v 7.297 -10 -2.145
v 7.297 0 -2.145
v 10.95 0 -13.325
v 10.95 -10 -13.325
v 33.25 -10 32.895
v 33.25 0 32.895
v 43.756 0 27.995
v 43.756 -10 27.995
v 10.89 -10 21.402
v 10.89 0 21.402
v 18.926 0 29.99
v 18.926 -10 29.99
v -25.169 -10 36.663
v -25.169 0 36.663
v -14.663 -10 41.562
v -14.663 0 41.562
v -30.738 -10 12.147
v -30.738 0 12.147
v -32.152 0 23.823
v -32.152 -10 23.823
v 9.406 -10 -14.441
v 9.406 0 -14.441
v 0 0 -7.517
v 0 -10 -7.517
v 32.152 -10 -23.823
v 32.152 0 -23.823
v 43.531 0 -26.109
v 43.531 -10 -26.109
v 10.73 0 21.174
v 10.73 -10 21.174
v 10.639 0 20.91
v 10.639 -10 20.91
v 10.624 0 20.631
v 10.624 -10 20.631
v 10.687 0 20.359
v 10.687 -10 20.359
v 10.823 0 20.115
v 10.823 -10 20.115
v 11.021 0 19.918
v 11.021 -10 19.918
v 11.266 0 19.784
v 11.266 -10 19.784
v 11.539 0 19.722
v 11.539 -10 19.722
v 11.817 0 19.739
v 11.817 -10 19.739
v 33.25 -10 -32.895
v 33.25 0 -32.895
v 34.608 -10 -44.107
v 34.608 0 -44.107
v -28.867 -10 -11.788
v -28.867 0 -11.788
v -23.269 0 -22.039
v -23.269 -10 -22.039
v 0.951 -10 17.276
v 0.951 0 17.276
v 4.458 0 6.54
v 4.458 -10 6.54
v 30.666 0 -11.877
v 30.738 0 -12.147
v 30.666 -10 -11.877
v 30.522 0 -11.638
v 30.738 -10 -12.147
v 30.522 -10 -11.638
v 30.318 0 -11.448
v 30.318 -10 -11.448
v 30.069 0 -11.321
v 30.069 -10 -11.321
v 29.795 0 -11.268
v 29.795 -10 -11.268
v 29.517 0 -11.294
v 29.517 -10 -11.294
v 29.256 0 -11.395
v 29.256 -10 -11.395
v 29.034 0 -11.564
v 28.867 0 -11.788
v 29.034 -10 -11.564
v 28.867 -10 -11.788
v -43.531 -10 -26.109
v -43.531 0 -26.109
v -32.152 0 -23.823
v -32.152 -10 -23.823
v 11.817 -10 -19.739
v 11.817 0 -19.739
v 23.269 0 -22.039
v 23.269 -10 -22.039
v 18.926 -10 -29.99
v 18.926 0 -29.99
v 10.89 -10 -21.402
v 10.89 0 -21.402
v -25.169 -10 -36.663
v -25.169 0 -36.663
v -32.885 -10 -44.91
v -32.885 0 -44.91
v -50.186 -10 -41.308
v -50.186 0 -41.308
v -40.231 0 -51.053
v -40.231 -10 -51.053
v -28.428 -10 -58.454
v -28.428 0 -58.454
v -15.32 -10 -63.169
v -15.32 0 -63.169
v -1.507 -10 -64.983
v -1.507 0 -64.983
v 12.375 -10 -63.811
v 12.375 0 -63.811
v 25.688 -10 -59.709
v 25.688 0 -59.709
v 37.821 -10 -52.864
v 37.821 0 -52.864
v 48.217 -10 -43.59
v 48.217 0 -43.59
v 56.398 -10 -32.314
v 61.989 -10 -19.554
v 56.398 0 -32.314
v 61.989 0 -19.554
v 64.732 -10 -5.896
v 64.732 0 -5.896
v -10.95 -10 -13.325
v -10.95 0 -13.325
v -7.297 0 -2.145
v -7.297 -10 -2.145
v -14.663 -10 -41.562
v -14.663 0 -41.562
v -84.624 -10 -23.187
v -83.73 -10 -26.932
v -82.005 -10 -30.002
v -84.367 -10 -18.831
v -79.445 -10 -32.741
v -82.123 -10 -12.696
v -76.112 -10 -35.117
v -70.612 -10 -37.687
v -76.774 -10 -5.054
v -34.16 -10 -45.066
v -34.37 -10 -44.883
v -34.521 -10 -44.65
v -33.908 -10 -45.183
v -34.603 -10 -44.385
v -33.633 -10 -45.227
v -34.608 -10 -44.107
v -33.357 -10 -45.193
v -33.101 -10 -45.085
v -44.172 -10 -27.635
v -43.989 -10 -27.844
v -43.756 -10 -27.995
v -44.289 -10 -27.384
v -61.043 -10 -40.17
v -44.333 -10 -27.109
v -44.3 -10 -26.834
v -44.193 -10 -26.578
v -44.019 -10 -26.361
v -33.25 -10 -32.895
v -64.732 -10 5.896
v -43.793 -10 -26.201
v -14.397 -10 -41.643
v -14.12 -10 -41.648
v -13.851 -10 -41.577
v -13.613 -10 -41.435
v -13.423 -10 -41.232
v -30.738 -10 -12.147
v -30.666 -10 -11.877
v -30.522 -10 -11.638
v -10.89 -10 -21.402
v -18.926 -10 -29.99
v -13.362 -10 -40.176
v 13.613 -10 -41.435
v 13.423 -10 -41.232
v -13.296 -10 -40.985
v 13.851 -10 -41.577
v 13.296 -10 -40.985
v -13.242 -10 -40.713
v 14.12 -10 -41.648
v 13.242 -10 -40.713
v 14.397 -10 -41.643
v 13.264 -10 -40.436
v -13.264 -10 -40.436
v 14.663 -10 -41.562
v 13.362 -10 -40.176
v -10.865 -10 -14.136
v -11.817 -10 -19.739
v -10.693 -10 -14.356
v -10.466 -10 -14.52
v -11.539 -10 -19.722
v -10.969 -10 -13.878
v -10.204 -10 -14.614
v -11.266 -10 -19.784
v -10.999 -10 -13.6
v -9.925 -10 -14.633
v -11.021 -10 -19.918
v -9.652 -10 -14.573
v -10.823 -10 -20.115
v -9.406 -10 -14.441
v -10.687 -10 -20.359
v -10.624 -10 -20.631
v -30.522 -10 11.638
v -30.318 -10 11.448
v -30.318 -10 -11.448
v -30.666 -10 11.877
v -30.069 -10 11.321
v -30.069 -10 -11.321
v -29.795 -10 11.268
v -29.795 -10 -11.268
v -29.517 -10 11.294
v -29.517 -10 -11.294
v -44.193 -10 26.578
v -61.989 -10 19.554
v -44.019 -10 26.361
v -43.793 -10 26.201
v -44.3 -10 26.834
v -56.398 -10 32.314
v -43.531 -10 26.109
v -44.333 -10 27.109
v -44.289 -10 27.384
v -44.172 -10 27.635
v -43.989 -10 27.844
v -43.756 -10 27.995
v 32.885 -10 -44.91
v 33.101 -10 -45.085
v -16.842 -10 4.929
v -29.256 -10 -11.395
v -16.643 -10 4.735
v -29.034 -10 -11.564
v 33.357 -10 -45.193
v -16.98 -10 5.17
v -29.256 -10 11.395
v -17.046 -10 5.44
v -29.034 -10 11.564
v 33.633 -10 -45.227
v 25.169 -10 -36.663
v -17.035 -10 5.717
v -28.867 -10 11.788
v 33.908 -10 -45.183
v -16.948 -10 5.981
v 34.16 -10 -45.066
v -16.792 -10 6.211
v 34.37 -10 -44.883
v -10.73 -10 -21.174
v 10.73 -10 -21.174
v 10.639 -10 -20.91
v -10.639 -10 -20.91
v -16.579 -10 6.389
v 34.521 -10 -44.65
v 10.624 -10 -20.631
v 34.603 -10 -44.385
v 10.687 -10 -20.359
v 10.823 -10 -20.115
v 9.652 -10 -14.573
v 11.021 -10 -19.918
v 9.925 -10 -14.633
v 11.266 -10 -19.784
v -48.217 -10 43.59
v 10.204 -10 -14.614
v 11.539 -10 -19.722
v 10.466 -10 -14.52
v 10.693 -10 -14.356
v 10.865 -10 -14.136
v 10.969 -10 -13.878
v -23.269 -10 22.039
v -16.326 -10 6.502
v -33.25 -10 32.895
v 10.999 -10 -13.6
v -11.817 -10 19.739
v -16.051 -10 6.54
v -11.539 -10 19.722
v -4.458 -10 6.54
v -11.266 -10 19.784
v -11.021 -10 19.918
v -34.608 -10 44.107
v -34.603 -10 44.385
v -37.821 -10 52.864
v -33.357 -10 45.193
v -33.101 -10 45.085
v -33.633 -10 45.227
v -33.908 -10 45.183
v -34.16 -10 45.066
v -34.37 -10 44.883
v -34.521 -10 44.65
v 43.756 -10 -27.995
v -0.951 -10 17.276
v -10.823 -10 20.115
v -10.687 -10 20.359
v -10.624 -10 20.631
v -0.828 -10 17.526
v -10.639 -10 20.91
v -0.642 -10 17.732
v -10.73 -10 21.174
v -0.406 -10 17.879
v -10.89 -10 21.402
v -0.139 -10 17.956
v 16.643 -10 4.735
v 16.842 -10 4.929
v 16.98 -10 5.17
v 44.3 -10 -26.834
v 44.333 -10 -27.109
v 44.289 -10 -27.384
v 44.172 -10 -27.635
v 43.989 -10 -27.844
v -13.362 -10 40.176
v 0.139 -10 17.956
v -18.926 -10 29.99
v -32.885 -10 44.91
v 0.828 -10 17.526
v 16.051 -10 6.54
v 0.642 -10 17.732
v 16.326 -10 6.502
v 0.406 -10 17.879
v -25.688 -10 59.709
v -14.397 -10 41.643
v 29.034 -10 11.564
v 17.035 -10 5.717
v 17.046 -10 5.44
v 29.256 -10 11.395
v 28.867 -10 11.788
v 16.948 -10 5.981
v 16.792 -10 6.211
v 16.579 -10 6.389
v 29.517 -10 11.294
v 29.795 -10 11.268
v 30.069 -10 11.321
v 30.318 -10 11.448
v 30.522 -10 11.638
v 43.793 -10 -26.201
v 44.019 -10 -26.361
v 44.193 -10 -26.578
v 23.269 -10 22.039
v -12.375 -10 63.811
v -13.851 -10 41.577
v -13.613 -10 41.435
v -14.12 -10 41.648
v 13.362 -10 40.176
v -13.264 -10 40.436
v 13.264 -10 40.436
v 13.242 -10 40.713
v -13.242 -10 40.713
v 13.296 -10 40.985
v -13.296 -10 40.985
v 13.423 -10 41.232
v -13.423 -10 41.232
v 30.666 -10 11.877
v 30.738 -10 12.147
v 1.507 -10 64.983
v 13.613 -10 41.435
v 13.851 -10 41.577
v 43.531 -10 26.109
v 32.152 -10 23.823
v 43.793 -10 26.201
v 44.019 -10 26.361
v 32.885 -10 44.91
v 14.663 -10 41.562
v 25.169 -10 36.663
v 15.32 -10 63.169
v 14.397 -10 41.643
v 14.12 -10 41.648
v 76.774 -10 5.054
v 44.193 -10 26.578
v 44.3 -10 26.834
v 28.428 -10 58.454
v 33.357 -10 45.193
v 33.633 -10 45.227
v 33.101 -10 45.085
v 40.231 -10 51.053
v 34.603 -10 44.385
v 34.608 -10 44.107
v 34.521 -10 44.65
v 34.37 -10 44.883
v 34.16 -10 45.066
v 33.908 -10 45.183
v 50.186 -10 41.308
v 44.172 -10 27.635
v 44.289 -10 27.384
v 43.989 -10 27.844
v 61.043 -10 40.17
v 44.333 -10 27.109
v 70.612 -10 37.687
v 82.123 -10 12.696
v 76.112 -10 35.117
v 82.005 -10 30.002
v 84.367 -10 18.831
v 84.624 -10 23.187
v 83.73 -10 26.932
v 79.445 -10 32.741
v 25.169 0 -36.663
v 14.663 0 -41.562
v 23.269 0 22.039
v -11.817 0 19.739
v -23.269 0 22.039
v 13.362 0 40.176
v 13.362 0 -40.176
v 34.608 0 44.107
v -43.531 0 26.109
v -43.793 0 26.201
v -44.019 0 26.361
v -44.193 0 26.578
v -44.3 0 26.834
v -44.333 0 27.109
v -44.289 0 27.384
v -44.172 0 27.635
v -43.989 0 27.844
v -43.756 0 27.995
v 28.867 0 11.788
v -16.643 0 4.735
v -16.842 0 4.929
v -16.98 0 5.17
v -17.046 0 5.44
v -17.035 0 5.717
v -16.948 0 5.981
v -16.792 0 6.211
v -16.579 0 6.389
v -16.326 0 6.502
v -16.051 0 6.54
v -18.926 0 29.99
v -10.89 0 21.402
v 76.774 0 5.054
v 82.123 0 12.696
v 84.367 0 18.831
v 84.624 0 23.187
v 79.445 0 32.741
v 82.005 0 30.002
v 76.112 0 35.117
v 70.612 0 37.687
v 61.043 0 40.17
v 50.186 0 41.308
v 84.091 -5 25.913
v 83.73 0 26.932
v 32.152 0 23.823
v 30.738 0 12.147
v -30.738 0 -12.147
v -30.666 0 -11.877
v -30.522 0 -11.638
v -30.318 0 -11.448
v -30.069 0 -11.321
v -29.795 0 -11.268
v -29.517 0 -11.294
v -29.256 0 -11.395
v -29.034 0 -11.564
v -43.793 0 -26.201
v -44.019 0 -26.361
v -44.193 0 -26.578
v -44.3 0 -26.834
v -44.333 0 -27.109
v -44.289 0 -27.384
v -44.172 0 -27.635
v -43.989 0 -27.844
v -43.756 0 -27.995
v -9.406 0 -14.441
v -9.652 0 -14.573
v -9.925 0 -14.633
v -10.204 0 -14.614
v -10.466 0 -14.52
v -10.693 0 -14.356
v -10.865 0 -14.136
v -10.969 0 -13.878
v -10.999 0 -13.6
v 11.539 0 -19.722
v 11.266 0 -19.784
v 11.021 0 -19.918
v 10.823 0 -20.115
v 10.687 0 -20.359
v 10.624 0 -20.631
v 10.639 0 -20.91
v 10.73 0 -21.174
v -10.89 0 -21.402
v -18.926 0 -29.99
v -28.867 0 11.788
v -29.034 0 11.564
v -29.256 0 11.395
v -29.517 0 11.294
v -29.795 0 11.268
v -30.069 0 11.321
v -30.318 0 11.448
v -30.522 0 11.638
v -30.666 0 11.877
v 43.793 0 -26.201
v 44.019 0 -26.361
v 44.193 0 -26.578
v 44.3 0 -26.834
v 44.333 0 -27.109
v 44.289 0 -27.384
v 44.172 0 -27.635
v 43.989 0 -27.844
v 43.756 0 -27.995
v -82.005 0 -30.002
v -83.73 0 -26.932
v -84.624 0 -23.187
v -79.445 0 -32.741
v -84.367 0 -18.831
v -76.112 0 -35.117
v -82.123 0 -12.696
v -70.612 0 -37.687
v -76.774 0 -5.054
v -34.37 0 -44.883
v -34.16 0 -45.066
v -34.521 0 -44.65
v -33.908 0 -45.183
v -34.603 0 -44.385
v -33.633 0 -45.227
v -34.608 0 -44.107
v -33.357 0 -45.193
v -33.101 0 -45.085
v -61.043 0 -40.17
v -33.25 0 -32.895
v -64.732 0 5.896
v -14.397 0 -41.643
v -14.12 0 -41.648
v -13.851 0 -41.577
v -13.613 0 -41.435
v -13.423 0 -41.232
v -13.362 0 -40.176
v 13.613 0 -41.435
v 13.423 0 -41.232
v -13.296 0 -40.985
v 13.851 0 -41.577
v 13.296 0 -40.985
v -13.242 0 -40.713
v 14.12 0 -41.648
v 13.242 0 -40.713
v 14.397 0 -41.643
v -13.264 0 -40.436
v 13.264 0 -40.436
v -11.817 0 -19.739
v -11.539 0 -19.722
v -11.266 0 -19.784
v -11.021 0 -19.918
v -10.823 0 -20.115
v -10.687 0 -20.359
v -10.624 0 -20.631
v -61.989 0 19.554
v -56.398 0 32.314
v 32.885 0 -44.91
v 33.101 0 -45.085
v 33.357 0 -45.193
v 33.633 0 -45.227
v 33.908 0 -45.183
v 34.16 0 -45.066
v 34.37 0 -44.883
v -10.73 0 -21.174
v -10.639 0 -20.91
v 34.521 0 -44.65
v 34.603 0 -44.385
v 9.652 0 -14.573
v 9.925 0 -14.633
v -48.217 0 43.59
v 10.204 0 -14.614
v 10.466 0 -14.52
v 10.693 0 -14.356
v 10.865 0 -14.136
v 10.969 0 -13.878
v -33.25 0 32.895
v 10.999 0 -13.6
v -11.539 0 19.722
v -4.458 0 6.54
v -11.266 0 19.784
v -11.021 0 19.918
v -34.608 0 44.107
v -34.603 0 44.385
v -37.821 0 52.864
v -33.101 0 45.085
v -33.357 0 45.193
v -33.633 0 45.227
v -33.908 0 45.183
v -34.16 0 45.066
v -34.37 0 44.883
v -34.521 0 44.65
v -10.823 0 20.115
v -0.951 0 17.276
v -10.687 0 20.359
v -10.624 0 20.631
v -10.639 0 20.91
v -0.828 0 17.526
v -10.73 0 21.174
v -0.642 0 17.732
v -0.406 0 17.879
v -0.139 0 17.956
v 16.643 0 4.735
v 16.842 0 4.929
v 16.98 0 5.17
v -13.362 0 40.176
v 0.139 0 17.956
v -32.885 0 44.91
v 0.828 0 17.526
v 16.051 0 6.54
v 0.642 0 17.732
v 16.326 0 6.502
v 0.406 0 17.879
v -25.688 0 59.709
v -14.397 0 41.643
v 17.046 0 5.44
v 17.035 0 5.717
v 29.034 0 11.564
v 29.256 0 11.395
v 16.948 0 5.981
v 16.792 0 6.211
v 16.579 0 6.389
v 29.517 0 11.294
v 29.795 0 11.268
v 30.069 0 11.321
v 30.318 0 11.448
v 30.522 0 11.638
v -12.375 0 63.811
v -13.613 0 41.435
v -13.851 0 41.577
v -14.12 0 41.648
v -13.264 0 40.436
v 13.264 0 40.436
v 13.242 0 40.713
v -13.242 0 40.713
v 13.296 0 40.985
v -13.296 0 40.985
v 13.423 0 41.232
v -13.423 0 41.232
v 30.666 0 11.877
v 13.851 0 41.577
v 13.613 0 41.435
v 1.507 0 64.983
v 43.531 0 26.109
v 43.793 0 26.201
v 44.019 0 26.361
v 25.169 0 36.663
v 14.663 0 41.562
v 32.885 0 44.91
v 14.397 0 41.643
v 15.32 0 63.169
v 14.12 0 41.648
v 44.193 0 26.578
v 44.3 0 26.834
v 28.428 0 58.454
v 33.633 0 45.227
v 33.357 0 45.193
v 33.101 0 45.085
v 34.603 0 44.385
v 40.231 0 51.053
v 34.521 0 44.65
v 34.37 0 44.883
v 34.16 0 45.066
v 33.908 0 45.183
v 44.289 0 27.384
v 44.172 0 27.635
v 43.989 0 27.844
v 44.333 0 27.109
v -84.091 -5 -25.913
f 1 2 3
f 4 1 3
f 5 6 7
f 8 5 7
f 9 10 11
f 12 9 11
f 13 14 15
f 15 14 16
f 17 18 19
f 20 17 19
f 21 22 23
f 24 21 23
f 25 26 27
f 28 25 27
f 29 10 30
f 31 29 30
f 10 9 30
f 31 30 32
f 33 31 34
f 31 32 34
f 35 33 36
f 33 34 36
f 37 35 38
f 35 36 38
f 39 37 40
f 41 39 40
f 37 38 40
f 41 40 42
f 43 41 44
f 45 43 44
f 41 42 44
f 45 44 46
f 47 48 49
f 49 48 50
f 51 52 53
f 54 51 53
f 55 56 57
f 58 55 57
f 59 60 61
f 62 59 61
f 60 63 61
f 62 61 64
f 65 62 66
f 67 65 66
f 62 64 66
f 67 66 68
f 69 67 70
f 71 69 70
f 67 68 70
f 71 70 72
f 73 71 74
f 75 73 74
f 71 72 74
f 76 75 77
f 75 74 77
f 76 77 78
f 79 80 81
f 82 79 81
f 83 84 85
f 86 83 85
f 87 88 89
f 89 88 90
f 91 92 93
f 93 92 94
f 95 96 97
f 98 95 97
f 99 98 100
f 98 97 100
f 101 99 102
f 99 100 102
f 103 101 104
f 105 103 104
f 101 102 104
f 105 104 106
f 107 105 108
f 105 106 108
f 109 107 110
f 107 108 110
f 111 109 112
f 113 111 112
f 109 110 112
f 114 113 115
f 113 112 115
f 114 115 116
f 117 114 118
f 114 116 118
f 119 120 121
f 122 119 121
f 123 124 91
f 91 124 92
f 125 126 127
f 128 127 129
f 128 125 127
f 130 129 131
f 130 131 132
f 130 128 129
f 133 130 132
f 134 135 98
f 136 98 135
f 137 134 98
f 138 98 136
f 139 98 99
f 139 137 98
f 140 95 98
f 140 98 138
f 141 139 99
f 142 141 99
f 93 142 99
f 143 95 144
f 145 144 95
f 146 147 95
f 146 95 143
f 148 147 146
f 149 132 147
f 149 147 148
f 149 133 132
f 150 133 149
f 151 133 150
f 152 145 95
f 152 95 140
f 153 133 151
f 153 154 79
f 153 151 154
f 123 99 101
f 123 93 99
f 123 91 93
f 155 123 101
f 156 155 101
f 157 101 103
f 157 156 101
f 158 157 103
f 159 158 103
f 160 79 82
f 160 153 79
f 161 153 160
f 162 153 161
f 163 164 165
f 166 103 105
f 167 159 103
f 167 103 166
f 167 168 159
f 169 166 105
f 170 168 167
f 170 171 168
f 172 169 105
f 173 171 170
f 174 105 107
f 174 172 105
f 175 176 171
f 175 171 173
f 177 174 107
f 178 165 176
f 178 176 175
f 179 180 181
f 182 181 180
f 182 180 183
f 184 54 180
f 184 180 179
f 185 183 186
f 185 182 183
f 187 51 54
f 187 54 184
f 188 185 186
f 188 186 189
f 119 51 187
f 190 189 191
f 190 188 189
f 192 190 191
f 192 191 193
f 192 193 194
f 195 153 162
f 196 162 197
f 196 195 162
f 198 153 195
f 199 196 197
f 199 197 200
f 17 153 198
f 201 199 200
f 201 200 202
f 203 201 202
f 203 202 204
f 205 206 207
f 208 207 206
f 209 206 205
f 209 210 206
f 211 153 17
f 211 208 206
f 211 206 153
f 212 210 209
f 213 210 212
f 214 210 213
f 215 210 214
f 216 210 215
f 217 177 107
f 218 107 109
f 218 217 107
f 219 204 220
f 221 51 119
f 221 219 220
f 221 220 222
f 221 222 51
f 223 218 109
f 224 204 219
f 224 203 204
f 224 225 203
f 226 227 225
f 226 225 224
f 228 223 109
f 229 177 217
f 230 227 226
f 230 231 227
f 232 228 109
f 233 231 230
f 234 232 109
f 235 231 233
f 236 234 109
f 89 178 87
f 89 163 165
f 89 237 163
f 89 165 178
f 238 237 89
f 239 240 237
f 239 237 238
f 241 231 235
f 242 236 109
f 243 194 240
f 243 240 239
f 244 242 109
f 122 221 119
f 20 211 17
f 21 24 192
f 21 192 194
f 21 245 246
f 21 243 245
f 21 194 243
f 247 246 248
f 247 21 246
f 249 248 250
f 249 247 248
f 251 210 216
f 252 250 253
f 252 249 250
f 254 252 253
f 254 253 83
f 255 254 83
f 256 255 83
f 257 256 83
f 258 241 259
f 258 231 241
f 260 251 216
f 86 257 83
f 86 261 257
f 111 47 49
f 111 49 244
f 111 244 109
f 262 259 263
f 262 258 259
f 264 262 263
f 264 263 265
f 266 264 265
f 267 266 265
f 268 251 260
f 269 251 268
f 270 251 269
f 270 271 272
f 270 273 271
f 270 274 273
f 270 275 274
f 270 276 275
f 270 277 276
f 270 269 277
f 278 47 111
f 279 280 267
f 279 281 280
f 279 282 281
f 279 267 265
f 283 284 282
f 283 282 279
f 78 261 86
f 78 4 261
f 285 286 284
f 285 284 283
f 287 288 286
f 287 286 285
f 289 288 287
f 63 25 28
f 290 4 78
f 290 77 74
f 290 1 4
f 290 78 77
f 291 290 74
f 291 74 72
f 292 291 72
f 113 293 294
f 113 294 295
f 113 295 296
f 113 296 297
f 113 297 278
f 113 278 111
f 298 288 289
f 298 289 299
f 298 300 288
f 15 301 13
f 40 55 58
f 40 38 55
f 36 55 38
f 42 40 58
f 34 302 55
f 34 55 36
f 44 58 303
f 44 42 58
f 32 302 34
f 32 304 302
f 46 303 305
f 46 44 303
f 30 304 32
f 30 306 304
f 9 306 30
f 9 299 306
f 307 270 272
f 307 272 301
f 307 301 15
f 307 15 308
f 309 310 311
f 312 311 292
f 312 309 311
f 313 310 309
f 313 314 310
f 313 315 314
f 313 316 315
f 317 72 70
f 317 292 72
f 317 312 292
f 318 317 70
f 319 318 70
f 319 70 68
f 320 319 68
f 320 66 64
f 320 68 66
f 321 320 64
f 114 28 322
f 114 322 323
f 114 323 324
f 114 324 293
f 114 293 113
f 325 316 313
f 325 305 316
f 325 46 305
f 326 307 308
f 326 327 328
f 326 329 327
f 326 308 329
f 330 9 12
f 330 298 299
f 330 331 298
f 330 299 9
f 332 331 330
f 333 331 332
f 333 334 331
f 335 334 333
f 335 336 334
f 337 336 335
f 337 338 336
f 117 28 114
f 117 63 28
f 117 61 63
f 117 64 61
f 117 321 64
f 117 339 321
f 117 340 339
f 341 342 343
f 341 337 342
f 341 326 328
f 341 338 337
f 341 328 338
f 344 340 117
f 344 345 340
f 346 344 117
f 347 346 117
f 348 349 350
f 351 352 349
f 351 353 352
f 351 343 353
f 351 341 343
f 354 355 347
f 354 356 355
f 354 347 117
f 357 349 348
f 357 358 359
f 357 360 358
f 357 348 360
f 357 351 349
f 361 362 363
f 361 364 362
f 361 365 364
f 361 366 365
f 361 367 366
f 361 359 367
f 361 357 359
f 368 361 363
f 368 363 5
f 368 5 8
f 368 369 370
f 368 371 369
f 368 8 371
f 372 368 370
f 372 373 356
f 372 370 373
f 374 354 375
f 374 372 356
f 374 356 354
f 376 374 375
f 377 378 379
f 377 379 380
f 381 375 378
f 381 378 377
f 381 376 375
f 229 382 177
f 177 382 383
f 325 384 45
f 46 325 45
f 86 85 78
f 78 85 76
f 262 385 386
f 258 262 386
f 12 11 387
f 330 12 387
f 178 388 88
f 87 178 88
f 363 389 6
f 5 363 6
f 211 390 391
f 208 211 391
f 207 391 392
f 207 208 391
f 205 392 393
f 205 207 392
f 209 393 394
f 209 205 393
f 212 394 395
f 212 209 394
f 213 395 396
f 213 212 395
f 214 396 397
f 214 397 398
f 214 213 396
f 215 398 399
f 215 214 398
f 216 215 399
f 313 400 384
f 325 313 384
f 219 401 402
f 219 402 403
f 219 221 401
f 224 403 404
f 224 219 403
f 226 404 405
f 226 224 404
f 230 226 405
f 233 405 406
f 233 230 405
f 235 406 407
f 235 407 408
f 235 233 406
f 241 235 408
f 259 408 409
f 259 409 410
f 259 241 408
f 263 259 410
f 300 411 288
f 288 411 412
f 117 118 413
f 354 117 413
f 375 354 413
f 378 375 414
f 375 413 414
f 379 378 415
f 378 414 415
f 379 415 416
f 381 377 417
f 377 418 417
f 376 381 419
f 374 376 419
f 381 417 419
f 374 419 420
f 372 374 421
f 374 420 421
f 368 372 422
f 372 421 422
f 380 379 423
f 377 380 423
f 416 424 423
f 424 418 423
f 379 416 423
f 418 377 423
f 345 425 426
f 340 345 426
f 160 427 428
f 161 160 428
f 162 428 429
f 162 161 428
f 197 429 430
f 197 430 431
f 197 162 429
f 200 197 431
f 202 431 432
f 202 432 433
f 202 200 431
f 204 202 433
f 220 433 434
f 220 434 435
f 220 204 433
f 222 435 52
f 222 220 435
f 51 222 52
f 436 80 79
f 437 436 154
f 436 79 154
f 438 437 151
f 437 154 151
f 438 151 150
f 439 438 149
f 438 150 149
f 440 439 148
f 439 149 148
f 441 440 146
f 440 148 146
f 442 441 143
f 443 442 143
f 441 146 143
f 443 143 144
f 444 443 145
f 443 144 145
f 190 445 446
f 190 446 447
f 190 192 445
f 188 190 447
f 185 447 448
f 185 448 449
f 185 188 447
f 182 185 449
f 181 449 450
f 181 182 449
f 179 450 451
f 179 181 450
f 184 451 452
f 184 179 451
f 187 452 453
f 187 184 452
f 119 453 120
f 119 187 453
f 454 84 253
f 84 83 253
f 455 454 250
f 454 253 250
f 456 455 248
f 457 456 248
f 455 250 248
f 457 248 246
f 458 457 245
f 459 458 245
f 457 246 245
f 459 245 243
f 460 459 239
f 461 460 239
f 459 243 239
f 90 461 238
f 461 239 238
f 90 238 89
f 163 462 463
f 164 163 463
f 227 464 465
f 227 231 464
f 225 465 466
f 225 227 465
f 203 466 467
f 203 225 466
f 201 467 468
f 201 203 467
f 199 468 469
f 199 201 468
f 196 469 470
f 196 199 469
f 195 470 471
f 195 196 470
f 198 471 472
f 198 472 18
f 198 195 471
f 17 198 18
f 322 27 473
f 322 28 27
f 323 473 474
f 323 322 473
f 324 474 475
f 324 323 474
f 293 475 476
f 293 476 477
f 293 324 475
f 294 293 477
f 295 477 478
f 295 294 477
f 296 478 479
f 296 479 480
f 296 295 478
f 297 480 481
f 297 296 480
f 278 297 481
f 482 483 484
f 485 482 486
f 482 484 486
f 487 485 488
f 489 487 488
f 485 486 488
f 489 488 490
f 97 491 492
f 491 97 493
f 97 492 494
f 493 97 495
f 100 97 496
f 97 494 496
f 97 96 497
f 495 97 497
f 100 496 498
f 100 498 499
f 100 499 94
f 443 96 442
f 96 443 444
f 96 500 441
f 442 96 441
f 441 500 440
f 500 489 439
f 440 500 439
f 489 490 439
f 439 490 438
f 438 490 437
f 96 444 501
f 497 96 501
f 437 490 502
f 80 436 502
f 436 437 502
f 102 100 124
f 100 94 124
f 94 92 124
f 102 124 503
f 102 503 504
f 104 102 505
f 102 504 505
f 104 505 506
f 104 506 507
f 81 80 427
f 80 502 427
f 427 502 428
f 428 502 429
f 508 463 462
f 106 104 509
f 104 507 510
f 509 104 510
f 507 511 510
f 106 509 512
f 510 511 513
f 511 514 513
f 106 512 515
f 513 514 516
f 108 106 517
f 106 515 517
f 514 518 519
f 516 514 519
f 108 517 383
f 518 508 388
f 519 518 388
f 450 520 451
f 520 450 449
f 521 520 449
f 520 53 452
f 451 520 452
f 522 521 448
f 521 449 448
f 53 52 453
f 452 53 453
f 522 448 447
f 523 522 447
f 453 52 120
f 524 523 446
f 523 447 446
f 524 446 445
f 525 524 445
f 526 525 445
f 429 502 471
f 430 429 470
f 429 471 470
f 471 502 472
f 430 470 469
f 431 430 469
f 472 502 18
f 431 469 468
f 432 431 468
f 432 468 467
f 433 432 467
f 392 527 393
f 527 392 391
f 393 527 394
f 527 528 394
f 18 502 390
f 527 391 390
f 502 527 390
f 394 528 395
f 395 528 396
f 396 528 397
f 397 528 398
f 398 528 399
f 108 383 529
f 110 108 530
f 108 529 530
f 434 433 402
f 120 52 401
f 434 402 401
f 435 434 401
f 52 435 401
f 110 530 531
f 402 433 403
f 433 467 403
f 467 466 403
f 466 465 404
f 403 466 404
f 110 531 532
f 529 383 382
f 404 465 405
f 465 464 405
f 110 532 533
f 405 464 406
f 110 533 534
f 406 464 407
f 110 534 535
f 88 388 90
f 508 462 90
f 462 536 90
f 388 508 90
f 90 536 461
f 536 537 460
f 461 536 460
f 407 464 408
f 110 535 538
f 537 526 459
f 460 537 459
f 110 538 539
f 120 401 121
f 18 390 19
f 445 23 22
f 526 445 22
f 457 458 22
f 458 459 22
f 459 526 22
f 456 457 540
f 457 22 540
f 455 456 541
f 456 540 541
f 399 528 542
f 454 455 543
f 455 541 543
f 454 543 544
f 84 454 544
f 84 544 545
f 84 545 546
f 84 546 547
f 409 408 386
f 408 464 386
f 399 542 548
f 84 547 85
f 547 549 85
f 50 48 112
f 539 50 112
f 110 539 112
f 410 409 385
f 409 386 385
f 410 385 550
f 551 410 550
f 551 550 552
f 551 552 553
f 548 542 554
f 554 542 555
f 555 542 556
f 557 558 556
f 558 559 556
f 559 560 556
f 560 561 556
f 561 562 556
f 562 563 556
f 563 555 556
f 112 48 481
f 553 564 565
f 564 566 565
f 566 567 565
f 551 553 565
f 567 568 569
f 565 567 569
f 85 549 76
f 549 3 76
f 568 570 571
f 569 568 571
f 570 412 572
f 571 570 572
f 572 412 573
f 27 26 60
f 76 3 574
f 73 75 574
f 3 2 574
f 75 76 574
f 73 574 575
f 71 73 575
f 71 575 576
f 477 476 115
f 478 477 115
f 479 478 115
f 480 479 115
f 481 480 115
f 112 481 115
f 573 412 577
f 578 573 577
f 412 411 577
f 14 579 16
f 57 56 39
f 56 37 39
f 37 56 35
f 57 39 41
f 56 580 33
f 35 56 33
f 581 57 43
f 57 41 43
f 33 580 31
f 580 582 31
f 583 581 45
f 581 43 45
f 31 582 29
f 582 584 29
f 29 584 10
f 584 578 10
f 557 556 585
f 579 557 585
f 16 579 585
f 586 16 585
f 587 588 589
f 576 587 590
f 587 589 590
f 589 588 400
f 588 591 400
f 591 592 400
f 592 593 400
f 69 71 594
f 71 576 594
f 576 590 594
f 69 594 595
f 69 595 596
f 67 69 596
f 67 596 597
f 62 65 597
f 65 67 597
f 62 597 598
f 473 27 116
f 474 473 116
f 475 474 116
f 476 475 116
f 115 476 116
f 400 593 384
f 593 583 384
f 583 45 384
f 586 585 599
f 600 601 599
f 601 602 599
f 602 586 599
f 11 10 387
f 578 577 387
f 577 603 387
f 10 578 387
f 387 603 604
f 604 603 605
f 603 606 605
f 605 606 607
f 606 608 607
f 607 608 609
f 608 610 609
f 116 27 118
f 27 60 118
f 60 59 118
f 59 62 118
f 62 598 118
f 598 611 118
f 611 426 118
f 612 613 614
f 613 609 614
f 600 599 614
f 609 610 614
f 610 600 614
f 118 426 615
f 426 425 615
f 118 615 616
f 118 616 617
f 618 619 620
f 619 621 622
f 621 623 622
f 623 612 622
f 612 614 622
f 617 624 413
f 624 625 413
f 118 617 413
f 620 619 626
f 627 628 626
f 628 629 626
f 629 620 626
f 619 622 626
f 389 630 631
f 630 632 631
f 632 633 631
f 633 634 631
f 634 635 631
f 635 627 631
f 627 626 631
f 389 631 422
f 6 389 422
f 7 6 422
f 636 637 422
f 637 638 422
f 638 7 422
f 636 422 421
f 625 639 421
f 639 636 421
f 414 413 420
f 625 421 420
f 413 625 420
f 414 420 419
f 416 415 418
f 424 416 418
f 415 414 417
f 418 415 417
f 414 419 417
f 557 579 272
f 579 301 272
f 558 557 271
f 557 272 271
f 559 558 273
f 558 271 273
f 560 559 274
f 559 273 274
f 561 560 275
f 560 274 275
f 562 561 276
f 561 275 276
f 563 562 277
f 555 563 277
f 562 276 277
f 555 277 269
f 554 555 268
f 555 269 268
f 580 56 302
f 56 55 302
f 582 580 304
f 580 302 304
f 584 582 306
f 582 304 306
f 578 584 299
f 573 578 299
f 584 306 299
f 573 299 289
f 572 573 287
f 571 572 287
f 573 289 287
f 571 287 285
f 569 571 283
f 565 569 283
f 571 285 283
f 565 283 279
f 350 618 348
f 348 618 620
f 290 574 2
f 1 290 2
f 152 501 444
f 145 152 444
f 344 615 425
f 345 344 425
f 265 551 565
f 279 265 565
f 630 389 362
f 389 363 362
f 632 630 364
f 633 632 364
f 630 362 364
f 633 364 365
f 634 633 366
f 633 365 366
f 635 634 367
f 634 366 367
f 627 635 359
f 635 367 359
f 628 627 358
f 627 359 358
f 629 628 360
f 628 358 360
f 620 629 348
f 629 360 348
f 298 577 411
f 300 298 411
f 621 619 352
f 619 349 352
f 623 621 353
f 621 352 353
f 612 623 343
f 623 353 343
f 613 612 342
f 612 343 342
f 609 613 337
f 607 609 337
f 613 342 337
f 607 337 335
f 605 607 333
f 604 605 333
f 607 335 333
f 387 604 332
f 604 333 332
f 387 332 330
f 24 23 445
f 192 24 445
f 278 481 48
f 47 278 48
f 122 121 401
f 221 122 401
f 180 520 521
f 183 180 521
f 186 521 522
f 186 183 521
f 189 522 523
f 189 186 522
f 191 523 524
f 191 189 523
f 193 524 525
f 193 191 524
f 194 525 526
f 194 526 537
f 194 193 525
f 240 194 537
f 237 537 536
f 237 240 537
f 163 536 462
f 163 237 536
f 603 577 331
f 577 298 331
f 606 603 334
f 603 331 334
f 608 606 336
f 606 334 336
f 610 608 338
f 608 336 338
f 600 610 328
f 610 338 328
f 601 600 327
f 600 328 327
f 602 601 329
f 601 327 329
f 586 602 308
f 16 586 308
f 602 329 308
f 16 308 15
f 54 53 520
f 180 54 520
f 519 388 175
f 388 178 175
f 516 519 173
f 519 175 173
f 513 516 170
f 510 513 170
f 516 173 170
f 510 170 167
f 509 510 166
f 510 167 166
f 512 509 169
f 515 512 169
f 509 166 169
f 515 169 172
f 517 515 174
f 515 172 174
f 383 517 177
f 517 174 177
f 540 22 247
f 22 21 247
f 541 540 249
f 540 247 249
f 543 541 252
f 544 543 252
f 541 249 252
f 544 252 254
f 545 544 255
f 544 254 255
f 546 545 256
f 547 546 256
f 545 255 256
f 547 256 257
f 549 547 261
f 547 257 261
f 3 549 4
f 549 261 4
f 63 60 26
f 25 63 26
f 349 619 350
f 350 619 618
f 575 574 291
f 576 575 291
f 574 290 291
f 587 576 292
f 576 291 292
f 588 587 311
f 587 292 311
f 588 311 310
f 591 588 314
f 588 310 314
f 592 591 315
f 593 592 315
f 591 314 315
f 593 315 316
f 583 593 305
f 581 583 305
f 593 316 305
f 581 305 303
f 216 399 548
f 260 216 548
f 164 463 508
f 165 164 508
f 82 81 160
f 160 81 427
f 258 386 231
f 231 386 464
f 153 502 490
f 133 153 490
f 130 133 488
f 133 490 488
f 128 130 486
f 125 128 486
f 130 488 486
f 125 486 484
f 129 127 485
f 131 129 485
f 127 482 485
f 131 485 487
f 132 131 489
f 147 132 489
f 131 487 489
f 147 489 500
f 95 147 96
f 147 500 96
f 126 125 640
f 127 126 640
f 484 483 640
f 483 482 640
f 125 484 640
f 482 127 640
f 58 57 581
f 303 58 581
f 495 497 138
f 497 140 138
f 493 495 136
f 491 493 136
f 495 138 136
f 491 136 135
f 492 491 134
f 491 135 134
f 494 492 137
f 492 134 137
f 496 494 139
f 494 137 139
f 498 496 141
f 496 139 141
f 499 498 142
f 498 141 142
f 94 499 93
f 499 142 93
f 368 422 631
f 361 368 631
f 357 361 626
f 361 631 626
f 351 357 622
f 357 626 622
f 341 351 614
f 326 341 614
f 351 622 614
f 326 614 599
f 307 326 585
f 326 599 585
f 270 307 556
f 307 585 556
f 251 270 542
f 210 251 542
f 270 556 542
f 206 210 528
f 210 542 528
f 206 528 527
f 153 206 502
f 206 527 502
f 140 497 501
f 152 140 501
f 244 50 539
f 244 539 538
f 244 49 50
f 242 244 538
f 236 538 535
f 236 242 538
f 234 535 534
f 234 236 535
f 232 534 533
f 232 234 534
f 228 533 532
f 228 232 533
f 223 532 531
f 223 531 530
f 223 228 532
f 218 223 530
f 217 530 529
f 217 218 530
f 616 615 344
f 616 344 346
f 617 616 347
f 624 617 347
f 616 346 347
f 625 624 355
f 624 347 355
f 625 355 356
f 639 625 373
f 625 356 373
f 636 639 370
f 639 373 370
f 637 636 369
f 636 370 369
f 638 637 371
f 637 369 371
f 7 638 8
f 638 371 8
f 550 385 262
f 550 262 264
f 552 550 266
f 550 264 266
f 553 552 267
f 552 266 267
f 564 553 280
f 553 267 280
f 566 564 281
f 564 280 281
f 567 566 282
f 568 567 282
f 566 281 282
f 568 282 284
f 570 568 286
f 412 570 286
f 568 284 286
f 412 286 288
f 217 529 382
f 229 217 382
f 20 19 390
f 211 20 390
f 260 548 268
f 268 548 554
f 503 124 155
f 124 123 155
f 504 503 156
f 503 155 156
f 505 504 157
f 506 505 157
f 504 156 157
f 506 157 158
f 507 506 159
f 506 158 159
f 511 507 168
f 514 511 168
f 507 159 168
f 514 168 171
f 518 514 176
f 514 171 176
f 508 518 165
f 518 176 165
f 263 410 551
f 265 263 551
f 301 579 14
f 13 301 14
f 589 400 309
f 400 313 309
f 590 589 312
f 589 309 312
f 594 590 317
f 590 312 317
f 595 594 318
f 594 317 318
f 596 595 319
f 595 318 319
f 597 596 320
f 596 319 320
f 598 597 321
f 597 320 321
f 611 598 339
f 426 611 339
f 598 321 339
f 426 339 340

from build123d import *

# Parameters (mm, degrees)
F1_DEPTH = 10
F2_R     = 1


with BuildPart() as f1:
    # F0 (on Front) → F1 (new body)
    with BuildSketch(Plane.XZ):
        with BuildLine():
            add(Edge.make_bspline(
                [(-64.7320359031, 5.8960603655), (-123.067537089, -37.923051477), (-50.1862094657, -41.3079215098)],
                knots=[2.3230612235, 2.3230612235, 2.3230612235, 3.9601240836, 3.9601240836, 3.9601240836], degree=2, weights=[1, 0.68329421, 1]))
            ThreePointArc((-50.1862094657, -41.3079215098), (19.1414535528, -62.1176686289), (64.7320359031, -5.8960603655))
            add(Edge.make_bspline(
                [(64.7320359031, -5.8960603655), (123.067537089, 37.923051477), (50.1862094657, 41.3079215098)],
                knots=[5.4646538771, 5.4646538771, 5.4646538771, 7.1017167372, 7.1017167372, 7.1017167372], degree=2, weights=[1, 0.68329421, 1]))
            ThreePointArc((50.1862094657, 41.3079215098), (-19.1414535528, 62.1176686289), (-64.7320359031, 5.8960603655))
        make_face()
        Polygon((-32.1517660584, -23.8230923945), (-30.3628287151, -9.0500386362), (-23.268740969, -22.0387625849), (-8.7588094598, -19.1241582619), (-18.9257184403, -29.9904996859), (-11.9027429034, -42.8490227002), (-25.1687248766, -36.6629937131), (-34.9759067352, -47.1448605899), (-33.2502658453, -32.8945092697), (-46.5162478185, -26.7084802827), align=None, mode=Mode.SUBTRACT)
        Polygon((32.1517660584, -23.8230923945), (46.5162478185, -26.7084802827), (33.2502658453, -32.8945092697), (34.9759067352, -47.1448605899), (25.1687248766, -36.6629937131), (11.9027429034, -42.8490227002), (18.9257184403, -29.9904996859), (8.7588094598, -19.1241582619), (23.268740969, -22.0387625849), (30.3628287151, -9.0500386362), align=None, mode=Mode.SUBTRACT)
        Polygon((-23.268740969, 22.0387625849), (-30.3628287151, 9.0500386362), (-32.1517660584, 23.8230923945), (-46.5162478185, 26.7084802827), (-33.2502658453, 32.8945092697), (-34.9759067352, 47.1448605899), (-25.1687248766, 36.6629937131), (-11.9027429034, 42.8490227002), (-18.9257184403, 29.9904996859), (-8.7588094598, 19.1241582619), align=None, mode=Mode.SUBTRACT)
        Polygon((0, -7.5166247813), (-11.9186989036, -16.2903154078), (-7.2966644485, -2.1453441579), (-19.0958885106, 6.540397666), (-4.4584969281, 6.540397666), (0, 20.1848893888), (4.4584969281, 6.540397666), (19.0958885106, 6.540397666), (7.2966644485, -2.1453441579), (11.9186989036, -16.2903154078), align=None, mode=Mode.SUBTRACT)
        Polygon((25.1687248766, 36.6629937131), (34.9759067352, 47.1448605899), (33.2502658453, 32.8945092697), (46.5162478185, 26.7084802827), (32.1517660584, 23.8230923945), (30.3628287151, 9.0500386362), (23.268740969, 22.0387625849), (8.7588094598, 19.1241582619), (18.9257184403, 29.9904996859), (11.9027429034, 42.8490227002), align=None, mode=Mode.SUBTRACT)
    extrude(amount=F1_DEPTH)

    # F2
    f2_edges = [f1.edges().sort_by_distance(p)[0] for p in [
        (-34.975907, -5, 47.144861),
        (-11.902743, -5, 42.849023),
        (-46.516248, -5, 26.70848),
        (-30.362829, -5, 9.050039),
        (-8.758809, -5, 19.124158),
        (46.516248, -5, 26.70848),
        (30.362829, -5, 9.050039),
        (8.758809, -5, 19.124158),
        (11.902743, -5, 42.849023),
        (34.975907, -5, 47.144861),
        (0, -5, 20.184889),
        (19.095889, -5, 6.540398),
        (-19.095889, -5, 6.540398),
        (11.918699, -5, -16.290315),
        (-11.918699, -5, -16.290315),
        (46.516248, -5, -26.70848),
        (30.362829, -5, -9.050039),
        (34.975907, -5, -47.144861),
        (8.758809, -5, -19.124158),
        (11.902743, -5, -42.849023),
        (-46.516248, -5, -26.70848),
        (-34.975907, -5, -47.144861),
        (-11.902743, -5, -42.849023),
        (-8.758809, -5, -19.124158),
        (-30.362829, -5, -9.050039),
    ]]
    fillet(f2_edges, radius=F2_R)


solid = f1.part
